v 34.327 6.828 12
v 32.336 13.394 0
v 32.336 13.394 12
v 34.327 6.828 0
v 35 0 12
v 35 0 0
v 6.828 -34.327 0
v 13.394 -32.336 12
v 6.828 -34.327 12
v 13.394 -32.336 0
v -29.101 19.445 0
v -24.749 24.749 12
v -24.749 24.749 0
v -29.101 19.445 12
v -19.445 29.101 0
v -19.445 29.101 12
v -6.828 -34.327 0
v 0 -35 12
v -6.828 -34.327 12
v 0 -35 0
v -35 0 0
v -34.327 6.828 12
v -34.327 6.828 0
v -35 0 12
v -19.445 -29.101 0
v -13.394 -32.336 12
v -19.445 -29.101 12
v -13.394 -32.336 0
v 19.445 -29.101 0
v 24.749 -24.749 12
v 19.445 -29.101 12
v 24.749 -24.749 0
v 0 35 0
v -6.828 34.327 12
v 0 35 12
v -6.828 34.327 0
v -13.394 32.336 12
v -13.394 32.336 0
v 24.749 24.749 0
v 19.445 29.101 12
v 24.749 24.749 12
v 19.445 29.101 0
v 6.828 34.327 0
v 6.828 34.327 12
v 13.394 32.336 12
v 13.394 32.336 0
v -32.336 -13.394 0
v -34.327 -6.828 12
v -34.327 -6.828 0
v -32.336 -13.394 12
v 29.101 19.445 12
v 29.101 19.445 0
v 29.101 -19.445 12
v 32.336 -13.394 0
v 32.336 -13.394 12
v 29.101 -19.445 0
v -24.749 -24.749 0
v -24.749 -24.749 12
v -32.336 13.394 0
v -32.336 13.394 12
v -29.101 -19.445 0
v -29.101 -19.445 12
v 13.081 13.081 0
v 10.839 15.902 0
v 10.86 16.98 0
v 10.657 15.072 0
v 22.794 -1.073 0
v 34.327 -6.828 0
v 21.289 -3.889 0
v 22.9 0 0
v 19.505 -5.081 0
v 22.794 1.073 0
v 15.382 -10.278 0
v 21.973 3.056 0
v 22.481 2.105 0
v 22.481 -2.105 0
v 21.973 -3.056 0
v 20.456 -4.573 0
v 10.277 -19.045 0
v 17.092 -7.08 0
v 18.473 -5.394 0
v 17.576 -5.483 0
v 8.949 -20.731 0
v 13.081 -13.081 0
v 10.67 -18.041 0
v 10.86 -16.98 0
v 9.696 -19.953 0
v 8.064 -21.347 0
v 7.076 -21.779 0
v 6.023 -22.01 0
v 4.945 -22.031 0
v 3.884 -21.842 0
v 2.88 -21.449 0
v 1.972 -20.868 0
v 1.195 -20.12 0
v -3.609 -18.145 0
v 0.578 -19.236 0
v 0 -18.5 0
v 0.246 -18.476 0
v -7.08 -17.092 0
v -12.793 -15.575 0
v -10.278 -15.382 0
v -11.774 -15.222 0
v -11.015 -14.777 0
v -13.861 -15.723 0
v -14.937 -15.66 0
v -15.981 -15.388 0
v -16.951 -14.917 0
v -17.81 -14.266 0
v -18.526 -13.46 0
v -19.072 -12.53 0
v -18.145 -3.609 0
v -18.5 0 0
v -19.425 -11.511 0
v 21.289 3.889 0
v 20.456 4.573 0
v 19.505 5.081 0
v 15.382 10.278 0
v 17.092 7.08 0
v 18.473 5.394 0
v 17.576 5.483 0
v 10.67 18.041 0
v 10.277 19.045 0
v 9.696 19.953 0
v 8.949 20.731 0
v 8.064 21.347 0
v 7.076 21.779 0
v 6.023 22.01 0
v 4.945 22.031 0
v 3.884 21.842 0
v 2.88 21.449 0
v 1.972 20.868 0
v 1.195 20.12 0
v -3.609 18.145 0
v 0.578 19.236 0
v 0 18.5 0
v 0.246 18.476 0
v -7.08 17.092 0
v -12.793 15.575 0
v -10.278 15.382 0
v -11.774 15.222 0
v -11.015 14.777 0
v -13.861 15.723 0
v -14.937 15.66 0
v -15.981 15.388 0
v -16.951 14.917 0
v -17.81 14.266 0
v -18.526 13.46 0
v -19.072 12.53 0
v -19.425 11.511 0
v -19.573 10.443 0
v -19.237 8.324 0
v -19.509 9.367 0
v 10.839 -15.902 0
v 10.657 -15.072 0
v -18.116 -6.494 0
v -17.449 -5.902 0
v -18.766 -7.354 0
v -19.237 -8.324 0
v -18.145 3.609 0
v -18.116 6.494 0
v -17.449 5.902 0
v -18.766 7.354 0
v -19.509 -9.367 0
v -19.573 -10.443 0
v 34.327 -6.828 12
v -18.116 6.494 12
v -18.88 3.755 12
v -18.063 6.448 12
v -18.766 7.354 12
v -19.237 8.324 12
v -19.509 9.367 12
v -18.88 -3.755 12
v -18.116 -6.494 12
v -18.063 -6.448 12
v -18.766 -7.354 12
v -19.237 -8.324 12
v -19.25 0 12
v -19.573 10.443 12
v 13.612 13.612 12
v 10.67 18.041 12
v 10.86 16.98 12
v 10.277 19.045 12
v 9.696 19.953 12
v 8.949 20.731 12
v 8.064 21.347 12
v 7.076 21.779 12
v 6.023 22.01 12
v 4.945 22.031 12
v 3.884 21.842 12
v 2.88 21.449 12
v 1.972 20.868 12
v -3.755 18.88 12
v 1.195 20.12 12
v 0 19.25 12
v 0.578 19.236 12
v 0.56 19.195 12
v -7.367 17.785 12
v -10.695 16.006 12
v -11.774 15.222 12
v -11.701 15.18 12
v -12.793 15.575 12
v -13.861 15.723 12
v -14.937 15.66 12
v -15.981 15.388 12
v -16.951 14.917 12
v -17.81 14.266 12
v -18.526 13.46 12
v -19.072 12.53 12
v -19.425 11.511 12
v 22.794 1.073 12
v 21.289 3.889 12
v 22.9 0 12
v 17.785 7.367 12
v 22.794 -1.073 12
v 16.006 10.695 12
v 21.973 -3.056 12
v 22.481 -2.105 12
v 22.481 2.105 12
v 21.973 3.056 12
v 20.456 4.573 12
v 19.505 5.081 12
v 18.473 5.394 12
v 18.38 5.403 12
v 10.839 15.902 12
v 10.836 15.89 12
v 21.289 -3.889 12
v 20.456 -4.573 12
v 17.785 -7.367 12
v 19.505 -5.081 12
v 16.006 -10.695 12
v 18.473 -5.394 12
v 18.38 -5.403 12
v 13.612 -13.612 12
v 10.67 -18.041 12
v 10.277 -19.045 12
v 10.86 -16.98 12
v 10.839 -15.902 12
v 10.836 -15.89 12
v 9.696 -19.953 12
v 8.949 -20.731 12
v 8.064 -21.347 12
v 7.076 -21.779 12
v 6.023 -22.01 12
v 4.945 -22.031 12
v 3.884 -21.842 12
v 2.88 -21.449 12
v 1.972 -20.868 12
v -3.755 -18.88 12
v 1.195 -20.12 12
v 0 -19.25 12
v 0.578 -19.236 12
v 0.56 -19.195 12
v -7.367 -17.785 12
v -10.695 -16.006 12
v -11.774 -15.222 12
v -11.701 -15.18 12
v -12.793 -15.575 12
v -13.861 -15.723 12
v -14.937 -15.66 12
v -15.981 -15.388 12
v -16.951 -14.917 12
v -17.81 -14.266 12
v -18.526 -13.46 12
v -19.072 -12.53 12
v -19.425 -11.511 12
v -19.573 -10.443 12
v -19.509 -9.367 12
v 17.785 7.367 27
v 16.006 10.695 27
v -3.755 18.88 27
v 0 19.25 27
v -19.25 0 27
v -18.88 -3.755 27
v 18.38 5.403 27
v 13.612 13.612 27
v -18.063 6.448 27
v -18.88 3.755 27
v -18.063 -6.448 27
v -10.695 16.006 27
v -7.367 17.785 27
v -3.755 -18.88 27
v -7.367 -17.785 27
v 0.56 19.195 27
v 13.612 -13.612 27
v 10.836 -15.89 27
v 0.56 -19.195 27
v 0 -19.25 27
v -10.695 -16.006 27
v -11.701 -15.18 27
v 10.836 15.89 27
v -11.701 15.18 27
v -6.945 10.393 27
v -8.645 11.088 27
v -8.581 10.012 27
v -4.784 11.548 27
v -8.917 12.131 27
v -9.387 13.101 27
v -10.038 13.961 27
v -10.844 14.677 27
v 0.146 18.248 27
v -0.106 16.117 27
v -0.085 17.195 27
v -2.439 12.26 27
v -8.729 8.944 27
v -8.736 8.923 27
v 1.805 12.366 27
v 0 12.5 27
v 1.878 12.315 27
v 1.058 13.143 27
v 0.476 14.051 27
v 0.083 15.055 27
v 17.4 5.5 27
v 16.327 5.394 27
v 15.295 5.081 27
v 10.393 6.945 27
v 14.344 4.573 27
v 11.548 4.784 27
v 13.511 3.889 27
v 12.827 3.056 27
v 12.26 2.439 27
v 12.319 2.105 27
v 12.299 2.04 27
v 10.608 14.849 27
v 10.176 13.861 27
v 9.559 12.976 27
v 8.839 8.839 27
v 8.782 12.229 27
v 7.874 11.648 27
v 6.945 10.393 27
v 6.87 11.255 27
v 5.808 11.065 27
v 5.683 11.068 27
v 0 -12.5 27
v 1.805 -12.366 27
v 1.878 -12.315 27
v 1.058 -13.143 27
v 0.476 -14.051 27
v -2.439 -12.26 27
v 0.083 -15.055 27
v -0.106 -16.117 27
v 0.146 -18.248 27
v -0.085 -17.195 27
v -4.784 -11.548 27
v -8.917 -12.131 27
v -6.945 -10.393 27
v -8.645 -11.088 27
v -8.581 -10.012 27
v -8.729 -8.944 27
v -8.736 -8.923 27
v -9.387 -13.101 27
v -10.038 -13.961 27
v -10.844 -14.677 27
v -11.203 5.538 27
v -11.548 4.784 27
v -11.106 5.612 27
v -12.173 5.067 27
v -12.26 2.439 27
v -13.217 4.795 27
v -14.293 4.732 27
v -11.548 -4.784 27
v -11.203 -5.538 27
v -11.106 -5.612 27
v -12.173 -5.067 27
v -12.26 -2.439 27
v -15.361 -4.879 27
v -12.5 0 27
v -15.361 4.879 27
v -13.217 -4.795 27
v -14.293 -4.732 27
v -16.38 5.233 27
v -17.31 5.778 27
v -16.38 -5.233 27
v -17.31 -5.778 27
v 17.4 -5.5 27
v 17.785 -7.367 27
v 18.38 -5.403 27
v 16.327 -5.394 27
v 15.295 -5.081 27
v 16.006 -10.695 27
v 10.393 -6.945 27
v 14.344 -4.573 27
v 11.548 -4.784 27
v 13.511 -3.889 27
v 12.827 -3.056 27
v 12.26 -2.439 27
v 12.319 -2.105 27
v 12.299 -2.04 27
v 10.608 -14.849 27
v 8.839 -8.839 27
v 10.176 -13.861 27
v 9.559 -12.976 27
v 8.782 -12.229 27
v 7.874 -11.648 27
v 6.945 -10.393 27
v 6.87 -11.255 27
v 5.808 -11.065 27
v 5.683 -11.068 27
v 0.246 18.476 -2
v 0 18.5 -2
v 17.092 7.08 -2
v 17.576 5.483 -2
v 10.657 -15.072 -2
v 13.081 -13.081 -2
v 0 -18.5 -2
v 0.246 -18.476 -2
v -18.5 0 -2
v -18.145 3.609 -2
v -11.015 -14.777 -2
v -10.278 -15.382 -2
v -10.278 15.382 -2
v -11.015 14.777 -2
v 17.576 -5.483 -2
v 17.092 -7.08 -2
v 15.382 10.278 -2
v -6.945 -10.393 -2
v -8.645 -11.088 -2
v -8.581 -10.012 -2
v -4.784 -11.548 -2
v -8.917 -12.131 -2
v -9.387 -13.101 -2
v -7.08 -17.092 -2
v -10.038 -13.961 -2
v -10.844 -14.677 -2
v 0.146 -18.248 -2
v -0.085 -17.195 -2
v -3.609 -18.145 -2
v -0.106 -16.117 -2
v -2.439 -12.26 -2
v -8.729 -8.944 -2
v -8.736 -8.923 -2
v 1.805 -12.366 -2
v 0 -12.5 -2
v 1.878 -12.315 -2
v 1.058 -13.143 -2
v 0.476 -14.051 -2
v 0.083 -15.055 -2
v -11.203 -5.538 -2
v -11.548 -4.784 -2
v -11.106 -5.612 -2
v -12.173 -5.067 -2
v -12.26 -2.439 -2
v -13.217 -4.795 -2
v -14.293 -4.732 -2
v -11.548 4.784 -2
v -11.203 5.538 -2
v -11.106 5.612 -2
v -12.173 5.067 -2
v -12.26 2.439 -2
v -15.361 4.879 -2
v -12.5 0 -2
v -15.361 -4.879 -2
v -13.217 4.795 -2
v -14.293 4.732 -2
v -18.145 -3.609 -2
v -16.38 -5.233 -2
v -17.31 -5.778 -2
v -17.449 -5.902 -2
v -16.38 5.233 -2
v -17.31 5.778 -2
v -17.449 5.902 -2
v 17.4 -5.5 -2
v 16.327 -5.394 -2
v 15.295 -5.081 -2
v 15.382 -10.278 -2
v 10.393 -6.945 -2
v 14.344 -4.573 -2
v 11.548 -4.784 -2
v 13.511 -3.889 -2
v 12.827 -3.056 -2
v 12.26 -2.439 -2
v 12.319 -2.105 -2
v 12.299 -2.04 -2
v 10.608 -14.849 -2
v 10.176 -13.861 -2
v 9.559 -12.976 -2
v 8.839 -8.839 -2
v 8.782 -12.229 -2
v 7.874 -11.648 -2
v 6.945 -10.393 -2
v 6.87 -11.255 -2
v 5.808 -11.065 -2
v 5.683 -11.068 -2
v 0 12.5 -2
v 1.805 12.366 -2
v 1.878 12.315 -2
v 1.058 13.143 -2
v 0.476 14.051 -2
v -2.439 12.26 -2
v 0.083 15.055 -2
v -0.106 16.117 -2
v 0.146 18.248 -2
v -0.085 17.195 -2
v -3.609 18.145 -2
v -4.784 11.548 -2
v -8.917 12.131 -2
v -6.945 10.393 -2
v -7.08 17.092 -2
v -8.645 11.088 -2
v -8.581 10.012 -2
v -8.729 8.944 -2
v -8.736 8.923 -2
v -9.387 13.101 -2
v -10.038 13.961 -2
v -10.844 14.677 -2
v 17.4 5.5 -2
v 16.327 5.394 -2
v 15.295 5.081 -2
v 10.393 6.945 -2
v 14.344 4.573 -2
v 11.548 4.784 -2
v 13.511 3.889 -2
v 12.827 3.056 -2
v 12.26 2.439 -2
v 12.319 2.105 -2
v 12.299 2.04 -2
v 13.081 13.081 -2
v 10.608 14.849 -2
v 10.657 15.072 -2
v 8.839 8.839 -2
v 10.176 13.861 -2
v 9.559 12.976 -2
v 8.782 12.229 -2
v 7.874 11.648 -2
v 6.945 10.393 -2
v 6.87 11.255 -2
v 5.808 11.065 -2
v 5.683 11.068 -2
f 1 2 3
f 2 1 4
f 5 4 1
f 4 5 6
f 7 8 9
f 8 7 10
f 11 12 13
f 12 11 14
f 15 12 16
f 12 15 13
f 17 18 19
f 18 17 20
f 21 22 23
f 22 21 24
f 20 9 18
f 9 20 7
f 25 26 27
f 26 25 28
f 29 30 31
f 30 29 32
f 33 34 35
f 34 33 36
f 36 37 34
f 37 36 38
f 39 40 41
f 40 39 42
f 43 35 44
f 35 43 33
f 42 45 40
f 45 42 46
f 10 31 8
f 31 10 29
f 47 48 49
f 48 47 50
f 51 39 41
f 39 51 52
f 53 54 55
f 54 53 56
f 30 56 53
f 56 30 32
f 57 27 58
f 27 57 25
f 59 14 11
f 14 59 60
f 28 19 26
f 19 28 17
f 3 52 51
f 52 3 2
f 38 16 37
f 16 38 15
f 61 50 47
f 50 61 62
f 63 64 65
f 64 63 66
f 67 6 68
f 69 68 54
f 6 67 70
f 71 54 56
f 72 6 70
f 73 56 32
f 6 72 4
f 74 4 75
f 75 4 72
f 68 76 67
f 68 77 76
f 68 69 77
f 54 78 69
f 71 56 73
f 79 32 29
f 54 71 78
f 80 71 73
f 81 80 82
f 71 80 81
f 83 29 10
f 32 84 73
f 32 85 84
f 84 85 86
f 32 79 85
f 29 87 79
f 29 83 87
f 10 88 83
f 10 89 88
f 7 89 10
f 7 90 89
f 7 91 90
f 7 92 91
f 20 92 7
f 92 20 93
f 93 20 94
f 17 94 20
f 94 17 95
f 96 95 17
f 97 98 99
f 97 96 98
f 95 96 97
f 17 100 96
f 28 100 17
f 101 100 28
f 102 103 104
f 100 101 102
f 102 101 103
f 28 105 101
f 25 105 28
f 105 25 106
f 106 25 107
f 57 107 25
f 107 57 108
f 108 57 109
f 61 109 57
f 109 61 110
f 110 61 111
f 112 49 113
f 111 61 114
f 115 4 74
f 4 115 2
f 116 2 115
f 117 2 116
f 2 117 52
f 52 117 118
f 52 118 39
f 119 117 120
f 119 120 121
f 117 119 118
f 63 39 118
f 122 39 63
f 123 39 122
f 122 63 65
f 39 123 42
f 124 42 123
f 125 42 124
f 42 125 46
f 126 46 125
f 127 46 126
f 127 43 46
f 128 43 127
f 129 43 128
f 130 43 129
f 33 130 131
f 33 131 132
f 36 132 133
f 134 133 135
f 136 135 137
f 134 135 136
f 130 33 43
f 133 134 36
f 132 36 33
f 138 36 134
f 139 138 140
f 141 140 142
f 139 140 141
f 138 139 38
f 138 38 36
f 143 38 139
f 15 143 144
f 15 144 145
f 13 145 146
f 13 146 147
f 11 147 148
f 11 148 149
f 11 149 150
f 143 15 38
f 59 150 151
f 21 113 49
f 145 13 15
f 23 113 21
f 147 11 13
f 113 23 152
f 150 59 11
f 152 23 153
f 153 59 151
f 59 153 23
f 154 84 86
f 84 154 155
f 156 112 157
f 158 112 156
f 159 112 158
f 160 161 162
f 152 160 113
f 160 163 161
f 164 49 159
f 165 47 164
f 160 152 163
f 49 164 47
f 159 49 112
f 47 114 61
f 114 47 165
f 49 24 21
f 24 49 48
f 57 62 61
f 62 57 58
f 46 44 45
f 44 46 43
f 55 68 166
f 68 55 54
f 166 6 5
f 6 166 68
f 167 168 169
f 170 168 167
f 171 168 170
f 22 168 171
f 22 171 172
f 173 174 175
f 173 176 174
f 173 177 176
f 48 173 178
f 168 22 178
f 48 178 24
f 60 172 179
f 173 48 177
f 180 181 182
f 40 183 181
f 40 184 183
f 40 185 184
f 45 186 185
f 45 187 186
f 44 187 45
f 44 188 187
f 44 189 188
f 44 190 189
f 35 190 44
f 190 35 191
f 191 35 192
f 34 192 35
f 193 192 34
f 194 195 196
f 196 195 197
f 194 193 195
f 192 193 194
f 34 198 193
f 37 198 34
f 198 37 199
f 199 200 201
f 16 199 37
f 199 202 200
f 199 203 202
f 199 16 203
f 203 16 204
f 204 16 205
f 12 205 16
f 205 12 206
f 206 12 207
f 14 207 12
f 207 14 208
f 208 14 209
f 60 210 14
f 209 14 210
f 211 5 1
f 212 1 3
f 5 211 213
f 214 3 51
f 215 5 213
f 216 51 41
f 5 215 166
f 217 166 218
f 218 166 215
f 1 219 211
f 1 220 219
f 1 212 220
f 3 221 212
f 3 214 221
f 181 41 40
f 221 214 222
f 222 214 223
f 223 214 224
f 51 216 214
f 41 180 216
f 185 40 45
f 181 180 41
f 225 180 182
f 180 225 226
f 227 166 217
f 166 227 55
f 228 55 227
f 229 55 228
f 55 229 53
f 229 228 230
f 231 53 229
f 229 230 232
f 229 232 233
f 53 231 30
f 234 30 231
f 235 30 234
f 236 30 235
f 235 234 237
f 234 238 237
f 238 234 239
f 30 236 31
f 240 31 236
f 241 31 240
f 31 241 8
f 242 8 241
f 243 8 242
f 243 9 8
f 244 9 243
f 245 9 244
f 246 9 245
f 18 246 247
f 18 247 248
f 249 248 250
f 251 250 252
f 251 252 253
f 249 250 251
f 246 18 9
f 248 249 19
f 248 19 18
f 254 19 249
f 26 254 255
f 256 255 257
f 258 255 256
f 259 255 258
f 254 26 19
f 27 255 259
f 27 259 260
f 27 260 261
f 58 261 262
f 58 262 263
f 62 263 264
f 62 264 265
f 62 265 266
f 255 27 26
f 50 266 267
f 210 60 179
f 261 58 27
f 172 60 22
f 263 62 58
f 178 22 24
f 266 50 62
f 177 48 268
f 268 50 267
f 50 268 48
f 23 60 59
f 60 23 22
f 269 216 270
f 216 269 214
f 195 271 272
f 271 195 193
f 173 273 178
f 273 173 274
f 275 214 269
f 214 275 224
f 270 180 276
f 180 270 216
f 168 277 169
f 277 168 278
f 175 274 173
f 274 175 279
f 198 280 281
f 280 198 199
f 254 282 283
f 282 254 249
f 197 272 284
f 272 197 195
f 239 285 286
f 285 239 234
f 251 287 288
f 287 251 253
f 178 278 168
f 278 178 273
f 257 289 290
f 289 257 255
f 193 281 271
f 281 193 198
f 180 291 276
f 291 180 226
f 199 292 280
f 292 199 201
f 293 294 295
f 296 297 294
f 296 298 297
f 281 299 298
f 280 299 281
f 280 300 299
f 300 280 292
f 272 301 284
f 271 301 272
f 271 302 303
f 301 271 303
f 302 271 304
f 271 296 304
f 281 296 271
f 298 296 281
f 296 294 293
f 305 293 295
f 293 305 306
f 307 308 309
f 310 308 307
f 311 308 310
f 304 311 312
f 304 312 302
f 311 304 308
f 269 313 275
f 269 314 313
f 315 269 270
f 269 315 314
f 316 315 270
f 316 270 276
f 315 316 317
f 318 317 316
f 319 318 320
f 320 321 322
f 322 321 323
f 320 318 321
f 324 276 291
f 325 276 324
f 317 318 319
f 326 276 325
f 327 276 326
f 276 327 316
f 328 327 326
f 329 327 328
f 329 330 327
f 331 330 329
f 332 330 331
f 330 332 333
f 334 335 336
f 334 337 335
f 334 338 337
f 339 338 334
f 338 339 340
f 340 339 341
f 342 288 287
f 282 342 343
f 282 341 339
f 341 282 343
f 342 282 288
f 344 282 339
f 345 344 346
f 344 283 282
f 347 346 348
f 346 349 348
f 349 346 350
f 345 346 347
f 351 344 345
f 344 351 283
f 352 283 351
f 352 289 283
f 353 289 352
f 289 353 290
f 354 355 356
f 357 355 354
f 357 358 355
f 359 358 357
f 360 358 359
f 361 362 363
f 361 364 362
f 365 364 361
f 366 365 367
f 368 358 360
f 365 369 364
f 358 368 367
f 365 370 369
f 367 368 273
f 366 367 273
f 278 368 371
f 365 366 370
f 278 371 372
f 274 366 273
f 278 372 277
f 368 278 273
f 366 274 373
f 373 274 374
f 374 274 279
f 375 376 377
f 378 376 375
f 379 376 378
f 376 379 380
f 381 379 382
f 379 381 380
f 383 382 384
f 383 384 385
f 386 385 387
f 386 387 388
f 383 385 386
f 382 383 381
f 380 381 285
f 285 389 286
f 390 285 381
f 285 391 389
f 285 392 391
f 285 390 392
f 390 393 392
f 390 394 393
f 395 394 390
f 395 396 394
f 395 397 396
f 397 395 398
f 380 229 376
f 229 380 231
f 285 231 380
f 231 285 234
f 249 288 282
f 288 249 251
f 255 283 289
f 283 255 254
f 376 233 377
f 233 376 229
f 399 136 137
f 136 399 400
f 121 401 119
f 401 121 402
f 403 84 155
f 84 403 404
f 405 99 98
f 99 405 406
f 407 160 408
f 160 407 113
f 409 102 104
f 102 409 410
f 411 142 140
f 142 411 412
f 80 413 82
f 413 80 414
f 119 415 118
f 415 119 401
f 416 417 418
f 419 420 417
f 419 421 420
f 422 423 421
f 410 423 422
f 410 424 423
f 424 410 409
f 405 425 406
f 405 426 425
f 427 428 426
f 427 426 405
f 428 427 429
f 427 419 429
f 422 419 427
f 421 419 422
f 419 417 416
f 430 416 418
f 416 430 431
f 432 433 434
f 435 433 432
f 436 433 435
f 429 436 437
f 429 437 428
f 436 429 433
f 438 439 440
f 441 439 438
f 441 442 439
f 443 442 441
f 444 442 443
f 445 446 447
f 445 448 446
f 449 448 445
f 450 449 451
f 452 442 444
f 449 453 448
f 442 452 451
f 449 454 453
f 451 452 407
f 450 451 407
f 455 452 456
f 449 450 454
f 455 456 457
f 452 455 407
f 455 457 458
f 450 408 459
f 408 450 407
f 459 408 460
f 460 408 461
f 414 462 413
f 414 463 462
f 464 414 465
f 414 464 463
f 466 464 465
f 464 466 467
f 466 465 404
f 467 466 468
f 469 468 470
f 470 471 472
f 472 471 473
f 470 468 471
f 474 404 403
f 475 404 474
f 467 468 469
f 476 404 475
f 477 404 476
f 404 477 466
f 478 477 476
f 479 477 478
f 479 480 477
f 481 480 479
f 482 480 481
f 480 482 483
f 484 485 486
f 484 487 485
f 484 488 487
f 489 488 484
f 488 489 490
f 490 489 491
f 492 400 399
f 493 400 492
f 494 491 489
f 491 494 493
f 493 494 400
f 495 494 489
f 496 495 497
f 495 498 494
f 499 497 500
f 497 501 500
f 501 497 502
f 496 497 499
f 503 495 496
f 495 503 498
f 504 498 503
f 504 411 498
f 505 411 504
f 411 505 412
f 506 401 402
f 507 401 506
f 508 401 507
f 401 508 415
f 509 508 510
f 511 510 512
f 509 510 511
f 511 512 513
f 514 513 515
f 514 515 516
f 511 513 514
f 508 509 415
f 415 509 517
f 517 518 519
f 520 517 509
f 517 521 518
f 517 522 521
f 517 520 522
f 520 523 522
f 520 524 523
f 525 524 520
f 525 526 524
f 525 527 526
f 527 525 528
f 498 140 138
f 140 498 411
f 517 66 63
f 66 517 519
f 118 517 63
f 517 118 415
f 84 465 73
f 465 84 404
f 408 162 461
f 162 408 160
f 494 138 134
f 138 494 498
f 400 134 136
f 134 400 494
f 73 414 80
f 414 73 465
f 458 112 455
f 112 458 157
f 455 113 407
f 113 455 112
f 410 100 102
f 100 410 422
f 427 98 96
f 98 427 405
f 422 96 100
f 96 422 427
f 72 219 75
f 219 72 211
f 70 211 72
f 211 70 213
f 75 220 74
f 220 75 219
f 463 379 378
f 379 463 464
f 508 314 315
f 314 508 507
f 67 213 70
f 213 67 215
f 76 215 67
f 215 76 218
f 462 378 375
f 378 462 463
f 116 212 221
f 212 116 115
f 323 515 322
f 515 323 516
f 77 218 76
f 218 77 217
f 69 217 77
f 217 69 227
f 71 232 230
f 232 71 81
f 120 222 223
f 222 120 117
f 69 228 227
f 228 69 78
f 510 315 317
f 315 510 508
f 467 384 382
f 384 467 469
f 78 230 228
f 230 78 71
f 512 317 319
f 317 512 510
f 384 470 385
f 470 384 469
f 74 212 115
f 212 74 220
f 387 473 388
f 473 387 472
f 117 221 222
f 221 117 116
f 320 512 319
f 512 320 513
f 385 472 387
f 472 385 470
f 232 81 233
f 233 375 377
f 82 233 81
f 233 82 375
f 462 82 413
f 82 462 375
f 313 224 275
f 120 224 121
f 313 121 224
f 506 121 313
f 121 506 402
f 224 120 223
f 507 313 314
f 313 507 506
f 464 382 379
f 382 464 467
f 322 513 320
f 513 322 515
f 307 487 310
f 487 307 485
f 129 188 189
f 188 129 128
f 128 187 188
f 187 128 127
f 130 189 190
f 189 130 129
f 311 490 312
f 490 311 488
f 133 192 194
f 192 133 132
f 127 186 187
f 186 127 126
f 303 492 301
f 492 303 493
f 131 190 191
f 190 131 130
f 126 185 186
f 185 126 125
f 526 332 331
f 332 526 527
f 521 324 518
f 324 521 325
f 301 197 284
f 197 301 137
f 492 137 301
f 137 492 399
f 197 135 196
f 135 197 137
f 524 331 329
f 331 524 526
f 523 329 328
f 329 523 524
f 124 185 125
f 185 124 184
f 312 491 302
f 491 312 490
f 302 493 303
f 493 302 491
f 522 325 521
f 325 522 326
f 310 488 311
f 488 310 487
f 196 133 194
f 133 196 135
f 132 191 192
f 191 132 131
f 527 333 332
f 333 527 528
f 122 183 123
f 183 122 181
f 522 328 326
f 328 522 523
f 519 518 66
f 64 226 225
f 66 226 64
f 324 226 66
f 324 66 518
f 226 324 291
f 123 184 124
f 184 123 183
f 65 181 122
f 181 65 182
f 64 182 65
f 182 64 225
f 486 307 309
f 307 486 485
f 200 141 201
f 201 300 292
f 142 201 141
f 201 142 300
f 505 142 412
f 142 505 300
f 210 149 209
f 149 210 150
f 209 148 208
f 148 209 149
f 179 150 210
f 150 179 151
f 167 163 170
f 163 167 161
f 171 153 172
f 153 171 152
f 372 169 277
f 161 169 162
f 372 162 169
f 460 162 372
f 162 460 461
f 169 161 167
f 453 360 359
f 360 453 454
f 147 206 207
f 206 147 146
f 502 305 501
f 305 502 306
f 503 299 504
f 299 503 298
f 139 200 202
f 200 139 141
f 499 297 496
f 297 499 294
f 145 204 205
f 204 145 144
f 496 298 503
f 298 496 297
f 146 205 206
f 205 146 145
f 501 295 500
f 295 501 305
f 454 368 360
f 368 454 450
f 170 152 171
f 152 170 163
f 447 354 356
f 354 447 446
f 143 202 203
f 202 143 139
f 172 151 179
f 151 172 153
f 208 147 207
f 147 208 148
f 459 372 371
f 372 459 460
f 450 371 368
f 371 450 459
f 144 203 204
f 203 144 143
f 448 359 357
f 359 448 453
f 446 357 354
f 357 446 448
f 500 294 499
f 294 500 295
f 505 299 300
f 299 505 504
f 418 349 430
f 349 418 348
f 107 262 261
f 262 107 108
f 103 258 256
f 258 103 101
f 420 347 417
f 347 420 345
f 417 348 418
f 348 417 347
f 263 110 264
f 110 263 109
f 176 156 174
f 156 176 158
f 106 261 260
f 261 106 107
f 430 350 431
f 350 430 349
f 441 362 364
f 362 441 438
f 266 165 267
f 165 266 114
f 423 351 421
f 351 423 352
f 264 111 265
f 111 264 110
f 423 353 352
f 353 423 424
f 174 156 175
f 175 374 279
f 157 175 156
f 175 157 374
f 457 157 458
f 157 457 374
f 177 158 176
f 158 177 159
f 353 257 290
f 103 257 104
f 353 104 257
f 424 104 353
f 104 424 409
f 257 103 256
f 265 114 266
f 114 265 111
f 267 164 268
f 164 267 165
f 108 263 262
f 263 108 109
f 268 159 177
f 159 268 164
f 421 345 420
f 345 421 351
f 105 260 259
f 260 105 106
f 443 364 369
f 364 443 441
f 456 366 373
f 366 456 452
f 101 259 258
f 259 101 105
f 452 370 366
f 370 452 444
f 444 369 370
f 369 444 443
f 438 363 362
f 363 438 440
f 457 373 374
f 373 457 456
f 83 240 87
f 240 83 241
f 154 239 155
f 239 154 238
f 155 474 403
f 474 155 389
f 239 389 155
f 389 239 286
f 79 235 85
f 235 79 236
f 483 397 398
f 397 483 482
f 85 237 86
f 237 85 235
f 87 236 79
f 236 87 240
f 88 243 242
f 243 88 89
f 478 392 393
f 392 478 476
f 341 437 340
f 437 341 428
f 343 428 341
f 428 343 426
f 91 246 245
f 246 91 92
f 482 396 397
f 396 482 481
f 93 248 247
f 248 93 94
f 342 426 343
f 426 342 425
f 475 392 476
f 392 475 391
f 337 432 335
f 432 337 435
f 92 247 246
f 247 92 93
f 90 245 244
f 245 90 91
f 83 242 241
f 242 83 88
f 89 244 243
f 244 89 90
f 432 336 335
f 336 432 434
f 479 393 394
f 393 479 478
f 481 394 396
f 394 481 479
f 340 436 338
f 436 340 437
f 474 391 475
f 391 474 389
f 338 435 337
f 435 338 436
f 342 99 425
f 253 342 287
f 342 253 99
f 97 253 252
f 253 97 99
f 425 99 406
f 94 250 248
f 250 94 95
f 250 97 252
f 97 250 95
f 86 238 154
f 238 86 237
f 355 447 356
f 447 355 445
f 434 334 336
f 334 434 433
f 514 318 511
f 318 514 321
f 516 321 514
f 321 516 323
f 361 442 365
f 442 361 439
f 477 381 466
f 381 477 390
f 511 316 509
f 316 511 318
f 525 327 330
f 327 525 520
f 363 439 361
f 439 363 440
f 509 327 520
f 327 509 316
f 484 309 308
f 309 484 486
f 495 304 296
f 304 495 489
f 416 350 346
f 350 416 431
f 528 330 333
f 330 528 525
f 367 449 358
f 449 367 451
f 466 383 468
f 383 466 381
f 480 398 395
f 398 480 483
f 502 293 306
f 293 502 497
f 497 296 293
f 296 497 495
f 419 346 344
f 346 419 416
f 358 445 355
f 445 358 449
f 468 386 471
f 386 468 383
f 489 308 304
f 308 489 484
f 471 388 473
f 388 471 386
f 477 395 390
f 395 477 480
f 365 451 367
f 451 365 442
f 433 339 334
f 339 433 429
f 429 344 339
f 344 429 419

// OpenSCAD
$fn = 32;

// ----------------------------------------------------------------------
// Bolt-circle flange: 70 mm outside, 5 bolt holes, bore 25 mm
// ----------------------------------------------------------------------

// --- parameters (mm) ---
flange_d = 70;            // flange outside diameter
flange_t = 12;            // flange thickness
bolts = 5;                // number of bolt holes
bolt_d = 11;              // bolt clearance
bolt_r = 17.4;            // bolt circle radius
bore_d = 25;              // centre bore
hub_d = 38.5;             // raised hub diameter
hub_h = 15;               // raised hub height
spigot_d = 37;            // spigot diameter
spigot_h = 3;             // spigot height below the flange
sink = 1;                 // overlap into the flange

module body() {
  cylinder(h = flange_t, d = flange_d);
  /* raised hub, sunk 1 mm into the flange */
  translate([0, 0, flange_t - 1]) cylinder(h = hub_h + 1, d = hub_d);
  /* spigot on the back face, sunk into the flange */
  translate([0, 0, -spigot_h + sink]) cylinder(h = spigot_h, d = spigot_d);
}

difference() {
  body();
  /* bolt circle */
  for (i = [0 : bolts - 1]) rotate([0, 0, i * 360 / bolts]) translate([bolt_r, 0, -spigot_h - 1]) cylinder(h = flange_t + hub_h + spigot_h + 3, d = bolt_d);
  translate([0, 0, -spigot_h - 1]) cylinder(h = flange_t + hub_h + spigot_h + 3, d = bore_d);
}
